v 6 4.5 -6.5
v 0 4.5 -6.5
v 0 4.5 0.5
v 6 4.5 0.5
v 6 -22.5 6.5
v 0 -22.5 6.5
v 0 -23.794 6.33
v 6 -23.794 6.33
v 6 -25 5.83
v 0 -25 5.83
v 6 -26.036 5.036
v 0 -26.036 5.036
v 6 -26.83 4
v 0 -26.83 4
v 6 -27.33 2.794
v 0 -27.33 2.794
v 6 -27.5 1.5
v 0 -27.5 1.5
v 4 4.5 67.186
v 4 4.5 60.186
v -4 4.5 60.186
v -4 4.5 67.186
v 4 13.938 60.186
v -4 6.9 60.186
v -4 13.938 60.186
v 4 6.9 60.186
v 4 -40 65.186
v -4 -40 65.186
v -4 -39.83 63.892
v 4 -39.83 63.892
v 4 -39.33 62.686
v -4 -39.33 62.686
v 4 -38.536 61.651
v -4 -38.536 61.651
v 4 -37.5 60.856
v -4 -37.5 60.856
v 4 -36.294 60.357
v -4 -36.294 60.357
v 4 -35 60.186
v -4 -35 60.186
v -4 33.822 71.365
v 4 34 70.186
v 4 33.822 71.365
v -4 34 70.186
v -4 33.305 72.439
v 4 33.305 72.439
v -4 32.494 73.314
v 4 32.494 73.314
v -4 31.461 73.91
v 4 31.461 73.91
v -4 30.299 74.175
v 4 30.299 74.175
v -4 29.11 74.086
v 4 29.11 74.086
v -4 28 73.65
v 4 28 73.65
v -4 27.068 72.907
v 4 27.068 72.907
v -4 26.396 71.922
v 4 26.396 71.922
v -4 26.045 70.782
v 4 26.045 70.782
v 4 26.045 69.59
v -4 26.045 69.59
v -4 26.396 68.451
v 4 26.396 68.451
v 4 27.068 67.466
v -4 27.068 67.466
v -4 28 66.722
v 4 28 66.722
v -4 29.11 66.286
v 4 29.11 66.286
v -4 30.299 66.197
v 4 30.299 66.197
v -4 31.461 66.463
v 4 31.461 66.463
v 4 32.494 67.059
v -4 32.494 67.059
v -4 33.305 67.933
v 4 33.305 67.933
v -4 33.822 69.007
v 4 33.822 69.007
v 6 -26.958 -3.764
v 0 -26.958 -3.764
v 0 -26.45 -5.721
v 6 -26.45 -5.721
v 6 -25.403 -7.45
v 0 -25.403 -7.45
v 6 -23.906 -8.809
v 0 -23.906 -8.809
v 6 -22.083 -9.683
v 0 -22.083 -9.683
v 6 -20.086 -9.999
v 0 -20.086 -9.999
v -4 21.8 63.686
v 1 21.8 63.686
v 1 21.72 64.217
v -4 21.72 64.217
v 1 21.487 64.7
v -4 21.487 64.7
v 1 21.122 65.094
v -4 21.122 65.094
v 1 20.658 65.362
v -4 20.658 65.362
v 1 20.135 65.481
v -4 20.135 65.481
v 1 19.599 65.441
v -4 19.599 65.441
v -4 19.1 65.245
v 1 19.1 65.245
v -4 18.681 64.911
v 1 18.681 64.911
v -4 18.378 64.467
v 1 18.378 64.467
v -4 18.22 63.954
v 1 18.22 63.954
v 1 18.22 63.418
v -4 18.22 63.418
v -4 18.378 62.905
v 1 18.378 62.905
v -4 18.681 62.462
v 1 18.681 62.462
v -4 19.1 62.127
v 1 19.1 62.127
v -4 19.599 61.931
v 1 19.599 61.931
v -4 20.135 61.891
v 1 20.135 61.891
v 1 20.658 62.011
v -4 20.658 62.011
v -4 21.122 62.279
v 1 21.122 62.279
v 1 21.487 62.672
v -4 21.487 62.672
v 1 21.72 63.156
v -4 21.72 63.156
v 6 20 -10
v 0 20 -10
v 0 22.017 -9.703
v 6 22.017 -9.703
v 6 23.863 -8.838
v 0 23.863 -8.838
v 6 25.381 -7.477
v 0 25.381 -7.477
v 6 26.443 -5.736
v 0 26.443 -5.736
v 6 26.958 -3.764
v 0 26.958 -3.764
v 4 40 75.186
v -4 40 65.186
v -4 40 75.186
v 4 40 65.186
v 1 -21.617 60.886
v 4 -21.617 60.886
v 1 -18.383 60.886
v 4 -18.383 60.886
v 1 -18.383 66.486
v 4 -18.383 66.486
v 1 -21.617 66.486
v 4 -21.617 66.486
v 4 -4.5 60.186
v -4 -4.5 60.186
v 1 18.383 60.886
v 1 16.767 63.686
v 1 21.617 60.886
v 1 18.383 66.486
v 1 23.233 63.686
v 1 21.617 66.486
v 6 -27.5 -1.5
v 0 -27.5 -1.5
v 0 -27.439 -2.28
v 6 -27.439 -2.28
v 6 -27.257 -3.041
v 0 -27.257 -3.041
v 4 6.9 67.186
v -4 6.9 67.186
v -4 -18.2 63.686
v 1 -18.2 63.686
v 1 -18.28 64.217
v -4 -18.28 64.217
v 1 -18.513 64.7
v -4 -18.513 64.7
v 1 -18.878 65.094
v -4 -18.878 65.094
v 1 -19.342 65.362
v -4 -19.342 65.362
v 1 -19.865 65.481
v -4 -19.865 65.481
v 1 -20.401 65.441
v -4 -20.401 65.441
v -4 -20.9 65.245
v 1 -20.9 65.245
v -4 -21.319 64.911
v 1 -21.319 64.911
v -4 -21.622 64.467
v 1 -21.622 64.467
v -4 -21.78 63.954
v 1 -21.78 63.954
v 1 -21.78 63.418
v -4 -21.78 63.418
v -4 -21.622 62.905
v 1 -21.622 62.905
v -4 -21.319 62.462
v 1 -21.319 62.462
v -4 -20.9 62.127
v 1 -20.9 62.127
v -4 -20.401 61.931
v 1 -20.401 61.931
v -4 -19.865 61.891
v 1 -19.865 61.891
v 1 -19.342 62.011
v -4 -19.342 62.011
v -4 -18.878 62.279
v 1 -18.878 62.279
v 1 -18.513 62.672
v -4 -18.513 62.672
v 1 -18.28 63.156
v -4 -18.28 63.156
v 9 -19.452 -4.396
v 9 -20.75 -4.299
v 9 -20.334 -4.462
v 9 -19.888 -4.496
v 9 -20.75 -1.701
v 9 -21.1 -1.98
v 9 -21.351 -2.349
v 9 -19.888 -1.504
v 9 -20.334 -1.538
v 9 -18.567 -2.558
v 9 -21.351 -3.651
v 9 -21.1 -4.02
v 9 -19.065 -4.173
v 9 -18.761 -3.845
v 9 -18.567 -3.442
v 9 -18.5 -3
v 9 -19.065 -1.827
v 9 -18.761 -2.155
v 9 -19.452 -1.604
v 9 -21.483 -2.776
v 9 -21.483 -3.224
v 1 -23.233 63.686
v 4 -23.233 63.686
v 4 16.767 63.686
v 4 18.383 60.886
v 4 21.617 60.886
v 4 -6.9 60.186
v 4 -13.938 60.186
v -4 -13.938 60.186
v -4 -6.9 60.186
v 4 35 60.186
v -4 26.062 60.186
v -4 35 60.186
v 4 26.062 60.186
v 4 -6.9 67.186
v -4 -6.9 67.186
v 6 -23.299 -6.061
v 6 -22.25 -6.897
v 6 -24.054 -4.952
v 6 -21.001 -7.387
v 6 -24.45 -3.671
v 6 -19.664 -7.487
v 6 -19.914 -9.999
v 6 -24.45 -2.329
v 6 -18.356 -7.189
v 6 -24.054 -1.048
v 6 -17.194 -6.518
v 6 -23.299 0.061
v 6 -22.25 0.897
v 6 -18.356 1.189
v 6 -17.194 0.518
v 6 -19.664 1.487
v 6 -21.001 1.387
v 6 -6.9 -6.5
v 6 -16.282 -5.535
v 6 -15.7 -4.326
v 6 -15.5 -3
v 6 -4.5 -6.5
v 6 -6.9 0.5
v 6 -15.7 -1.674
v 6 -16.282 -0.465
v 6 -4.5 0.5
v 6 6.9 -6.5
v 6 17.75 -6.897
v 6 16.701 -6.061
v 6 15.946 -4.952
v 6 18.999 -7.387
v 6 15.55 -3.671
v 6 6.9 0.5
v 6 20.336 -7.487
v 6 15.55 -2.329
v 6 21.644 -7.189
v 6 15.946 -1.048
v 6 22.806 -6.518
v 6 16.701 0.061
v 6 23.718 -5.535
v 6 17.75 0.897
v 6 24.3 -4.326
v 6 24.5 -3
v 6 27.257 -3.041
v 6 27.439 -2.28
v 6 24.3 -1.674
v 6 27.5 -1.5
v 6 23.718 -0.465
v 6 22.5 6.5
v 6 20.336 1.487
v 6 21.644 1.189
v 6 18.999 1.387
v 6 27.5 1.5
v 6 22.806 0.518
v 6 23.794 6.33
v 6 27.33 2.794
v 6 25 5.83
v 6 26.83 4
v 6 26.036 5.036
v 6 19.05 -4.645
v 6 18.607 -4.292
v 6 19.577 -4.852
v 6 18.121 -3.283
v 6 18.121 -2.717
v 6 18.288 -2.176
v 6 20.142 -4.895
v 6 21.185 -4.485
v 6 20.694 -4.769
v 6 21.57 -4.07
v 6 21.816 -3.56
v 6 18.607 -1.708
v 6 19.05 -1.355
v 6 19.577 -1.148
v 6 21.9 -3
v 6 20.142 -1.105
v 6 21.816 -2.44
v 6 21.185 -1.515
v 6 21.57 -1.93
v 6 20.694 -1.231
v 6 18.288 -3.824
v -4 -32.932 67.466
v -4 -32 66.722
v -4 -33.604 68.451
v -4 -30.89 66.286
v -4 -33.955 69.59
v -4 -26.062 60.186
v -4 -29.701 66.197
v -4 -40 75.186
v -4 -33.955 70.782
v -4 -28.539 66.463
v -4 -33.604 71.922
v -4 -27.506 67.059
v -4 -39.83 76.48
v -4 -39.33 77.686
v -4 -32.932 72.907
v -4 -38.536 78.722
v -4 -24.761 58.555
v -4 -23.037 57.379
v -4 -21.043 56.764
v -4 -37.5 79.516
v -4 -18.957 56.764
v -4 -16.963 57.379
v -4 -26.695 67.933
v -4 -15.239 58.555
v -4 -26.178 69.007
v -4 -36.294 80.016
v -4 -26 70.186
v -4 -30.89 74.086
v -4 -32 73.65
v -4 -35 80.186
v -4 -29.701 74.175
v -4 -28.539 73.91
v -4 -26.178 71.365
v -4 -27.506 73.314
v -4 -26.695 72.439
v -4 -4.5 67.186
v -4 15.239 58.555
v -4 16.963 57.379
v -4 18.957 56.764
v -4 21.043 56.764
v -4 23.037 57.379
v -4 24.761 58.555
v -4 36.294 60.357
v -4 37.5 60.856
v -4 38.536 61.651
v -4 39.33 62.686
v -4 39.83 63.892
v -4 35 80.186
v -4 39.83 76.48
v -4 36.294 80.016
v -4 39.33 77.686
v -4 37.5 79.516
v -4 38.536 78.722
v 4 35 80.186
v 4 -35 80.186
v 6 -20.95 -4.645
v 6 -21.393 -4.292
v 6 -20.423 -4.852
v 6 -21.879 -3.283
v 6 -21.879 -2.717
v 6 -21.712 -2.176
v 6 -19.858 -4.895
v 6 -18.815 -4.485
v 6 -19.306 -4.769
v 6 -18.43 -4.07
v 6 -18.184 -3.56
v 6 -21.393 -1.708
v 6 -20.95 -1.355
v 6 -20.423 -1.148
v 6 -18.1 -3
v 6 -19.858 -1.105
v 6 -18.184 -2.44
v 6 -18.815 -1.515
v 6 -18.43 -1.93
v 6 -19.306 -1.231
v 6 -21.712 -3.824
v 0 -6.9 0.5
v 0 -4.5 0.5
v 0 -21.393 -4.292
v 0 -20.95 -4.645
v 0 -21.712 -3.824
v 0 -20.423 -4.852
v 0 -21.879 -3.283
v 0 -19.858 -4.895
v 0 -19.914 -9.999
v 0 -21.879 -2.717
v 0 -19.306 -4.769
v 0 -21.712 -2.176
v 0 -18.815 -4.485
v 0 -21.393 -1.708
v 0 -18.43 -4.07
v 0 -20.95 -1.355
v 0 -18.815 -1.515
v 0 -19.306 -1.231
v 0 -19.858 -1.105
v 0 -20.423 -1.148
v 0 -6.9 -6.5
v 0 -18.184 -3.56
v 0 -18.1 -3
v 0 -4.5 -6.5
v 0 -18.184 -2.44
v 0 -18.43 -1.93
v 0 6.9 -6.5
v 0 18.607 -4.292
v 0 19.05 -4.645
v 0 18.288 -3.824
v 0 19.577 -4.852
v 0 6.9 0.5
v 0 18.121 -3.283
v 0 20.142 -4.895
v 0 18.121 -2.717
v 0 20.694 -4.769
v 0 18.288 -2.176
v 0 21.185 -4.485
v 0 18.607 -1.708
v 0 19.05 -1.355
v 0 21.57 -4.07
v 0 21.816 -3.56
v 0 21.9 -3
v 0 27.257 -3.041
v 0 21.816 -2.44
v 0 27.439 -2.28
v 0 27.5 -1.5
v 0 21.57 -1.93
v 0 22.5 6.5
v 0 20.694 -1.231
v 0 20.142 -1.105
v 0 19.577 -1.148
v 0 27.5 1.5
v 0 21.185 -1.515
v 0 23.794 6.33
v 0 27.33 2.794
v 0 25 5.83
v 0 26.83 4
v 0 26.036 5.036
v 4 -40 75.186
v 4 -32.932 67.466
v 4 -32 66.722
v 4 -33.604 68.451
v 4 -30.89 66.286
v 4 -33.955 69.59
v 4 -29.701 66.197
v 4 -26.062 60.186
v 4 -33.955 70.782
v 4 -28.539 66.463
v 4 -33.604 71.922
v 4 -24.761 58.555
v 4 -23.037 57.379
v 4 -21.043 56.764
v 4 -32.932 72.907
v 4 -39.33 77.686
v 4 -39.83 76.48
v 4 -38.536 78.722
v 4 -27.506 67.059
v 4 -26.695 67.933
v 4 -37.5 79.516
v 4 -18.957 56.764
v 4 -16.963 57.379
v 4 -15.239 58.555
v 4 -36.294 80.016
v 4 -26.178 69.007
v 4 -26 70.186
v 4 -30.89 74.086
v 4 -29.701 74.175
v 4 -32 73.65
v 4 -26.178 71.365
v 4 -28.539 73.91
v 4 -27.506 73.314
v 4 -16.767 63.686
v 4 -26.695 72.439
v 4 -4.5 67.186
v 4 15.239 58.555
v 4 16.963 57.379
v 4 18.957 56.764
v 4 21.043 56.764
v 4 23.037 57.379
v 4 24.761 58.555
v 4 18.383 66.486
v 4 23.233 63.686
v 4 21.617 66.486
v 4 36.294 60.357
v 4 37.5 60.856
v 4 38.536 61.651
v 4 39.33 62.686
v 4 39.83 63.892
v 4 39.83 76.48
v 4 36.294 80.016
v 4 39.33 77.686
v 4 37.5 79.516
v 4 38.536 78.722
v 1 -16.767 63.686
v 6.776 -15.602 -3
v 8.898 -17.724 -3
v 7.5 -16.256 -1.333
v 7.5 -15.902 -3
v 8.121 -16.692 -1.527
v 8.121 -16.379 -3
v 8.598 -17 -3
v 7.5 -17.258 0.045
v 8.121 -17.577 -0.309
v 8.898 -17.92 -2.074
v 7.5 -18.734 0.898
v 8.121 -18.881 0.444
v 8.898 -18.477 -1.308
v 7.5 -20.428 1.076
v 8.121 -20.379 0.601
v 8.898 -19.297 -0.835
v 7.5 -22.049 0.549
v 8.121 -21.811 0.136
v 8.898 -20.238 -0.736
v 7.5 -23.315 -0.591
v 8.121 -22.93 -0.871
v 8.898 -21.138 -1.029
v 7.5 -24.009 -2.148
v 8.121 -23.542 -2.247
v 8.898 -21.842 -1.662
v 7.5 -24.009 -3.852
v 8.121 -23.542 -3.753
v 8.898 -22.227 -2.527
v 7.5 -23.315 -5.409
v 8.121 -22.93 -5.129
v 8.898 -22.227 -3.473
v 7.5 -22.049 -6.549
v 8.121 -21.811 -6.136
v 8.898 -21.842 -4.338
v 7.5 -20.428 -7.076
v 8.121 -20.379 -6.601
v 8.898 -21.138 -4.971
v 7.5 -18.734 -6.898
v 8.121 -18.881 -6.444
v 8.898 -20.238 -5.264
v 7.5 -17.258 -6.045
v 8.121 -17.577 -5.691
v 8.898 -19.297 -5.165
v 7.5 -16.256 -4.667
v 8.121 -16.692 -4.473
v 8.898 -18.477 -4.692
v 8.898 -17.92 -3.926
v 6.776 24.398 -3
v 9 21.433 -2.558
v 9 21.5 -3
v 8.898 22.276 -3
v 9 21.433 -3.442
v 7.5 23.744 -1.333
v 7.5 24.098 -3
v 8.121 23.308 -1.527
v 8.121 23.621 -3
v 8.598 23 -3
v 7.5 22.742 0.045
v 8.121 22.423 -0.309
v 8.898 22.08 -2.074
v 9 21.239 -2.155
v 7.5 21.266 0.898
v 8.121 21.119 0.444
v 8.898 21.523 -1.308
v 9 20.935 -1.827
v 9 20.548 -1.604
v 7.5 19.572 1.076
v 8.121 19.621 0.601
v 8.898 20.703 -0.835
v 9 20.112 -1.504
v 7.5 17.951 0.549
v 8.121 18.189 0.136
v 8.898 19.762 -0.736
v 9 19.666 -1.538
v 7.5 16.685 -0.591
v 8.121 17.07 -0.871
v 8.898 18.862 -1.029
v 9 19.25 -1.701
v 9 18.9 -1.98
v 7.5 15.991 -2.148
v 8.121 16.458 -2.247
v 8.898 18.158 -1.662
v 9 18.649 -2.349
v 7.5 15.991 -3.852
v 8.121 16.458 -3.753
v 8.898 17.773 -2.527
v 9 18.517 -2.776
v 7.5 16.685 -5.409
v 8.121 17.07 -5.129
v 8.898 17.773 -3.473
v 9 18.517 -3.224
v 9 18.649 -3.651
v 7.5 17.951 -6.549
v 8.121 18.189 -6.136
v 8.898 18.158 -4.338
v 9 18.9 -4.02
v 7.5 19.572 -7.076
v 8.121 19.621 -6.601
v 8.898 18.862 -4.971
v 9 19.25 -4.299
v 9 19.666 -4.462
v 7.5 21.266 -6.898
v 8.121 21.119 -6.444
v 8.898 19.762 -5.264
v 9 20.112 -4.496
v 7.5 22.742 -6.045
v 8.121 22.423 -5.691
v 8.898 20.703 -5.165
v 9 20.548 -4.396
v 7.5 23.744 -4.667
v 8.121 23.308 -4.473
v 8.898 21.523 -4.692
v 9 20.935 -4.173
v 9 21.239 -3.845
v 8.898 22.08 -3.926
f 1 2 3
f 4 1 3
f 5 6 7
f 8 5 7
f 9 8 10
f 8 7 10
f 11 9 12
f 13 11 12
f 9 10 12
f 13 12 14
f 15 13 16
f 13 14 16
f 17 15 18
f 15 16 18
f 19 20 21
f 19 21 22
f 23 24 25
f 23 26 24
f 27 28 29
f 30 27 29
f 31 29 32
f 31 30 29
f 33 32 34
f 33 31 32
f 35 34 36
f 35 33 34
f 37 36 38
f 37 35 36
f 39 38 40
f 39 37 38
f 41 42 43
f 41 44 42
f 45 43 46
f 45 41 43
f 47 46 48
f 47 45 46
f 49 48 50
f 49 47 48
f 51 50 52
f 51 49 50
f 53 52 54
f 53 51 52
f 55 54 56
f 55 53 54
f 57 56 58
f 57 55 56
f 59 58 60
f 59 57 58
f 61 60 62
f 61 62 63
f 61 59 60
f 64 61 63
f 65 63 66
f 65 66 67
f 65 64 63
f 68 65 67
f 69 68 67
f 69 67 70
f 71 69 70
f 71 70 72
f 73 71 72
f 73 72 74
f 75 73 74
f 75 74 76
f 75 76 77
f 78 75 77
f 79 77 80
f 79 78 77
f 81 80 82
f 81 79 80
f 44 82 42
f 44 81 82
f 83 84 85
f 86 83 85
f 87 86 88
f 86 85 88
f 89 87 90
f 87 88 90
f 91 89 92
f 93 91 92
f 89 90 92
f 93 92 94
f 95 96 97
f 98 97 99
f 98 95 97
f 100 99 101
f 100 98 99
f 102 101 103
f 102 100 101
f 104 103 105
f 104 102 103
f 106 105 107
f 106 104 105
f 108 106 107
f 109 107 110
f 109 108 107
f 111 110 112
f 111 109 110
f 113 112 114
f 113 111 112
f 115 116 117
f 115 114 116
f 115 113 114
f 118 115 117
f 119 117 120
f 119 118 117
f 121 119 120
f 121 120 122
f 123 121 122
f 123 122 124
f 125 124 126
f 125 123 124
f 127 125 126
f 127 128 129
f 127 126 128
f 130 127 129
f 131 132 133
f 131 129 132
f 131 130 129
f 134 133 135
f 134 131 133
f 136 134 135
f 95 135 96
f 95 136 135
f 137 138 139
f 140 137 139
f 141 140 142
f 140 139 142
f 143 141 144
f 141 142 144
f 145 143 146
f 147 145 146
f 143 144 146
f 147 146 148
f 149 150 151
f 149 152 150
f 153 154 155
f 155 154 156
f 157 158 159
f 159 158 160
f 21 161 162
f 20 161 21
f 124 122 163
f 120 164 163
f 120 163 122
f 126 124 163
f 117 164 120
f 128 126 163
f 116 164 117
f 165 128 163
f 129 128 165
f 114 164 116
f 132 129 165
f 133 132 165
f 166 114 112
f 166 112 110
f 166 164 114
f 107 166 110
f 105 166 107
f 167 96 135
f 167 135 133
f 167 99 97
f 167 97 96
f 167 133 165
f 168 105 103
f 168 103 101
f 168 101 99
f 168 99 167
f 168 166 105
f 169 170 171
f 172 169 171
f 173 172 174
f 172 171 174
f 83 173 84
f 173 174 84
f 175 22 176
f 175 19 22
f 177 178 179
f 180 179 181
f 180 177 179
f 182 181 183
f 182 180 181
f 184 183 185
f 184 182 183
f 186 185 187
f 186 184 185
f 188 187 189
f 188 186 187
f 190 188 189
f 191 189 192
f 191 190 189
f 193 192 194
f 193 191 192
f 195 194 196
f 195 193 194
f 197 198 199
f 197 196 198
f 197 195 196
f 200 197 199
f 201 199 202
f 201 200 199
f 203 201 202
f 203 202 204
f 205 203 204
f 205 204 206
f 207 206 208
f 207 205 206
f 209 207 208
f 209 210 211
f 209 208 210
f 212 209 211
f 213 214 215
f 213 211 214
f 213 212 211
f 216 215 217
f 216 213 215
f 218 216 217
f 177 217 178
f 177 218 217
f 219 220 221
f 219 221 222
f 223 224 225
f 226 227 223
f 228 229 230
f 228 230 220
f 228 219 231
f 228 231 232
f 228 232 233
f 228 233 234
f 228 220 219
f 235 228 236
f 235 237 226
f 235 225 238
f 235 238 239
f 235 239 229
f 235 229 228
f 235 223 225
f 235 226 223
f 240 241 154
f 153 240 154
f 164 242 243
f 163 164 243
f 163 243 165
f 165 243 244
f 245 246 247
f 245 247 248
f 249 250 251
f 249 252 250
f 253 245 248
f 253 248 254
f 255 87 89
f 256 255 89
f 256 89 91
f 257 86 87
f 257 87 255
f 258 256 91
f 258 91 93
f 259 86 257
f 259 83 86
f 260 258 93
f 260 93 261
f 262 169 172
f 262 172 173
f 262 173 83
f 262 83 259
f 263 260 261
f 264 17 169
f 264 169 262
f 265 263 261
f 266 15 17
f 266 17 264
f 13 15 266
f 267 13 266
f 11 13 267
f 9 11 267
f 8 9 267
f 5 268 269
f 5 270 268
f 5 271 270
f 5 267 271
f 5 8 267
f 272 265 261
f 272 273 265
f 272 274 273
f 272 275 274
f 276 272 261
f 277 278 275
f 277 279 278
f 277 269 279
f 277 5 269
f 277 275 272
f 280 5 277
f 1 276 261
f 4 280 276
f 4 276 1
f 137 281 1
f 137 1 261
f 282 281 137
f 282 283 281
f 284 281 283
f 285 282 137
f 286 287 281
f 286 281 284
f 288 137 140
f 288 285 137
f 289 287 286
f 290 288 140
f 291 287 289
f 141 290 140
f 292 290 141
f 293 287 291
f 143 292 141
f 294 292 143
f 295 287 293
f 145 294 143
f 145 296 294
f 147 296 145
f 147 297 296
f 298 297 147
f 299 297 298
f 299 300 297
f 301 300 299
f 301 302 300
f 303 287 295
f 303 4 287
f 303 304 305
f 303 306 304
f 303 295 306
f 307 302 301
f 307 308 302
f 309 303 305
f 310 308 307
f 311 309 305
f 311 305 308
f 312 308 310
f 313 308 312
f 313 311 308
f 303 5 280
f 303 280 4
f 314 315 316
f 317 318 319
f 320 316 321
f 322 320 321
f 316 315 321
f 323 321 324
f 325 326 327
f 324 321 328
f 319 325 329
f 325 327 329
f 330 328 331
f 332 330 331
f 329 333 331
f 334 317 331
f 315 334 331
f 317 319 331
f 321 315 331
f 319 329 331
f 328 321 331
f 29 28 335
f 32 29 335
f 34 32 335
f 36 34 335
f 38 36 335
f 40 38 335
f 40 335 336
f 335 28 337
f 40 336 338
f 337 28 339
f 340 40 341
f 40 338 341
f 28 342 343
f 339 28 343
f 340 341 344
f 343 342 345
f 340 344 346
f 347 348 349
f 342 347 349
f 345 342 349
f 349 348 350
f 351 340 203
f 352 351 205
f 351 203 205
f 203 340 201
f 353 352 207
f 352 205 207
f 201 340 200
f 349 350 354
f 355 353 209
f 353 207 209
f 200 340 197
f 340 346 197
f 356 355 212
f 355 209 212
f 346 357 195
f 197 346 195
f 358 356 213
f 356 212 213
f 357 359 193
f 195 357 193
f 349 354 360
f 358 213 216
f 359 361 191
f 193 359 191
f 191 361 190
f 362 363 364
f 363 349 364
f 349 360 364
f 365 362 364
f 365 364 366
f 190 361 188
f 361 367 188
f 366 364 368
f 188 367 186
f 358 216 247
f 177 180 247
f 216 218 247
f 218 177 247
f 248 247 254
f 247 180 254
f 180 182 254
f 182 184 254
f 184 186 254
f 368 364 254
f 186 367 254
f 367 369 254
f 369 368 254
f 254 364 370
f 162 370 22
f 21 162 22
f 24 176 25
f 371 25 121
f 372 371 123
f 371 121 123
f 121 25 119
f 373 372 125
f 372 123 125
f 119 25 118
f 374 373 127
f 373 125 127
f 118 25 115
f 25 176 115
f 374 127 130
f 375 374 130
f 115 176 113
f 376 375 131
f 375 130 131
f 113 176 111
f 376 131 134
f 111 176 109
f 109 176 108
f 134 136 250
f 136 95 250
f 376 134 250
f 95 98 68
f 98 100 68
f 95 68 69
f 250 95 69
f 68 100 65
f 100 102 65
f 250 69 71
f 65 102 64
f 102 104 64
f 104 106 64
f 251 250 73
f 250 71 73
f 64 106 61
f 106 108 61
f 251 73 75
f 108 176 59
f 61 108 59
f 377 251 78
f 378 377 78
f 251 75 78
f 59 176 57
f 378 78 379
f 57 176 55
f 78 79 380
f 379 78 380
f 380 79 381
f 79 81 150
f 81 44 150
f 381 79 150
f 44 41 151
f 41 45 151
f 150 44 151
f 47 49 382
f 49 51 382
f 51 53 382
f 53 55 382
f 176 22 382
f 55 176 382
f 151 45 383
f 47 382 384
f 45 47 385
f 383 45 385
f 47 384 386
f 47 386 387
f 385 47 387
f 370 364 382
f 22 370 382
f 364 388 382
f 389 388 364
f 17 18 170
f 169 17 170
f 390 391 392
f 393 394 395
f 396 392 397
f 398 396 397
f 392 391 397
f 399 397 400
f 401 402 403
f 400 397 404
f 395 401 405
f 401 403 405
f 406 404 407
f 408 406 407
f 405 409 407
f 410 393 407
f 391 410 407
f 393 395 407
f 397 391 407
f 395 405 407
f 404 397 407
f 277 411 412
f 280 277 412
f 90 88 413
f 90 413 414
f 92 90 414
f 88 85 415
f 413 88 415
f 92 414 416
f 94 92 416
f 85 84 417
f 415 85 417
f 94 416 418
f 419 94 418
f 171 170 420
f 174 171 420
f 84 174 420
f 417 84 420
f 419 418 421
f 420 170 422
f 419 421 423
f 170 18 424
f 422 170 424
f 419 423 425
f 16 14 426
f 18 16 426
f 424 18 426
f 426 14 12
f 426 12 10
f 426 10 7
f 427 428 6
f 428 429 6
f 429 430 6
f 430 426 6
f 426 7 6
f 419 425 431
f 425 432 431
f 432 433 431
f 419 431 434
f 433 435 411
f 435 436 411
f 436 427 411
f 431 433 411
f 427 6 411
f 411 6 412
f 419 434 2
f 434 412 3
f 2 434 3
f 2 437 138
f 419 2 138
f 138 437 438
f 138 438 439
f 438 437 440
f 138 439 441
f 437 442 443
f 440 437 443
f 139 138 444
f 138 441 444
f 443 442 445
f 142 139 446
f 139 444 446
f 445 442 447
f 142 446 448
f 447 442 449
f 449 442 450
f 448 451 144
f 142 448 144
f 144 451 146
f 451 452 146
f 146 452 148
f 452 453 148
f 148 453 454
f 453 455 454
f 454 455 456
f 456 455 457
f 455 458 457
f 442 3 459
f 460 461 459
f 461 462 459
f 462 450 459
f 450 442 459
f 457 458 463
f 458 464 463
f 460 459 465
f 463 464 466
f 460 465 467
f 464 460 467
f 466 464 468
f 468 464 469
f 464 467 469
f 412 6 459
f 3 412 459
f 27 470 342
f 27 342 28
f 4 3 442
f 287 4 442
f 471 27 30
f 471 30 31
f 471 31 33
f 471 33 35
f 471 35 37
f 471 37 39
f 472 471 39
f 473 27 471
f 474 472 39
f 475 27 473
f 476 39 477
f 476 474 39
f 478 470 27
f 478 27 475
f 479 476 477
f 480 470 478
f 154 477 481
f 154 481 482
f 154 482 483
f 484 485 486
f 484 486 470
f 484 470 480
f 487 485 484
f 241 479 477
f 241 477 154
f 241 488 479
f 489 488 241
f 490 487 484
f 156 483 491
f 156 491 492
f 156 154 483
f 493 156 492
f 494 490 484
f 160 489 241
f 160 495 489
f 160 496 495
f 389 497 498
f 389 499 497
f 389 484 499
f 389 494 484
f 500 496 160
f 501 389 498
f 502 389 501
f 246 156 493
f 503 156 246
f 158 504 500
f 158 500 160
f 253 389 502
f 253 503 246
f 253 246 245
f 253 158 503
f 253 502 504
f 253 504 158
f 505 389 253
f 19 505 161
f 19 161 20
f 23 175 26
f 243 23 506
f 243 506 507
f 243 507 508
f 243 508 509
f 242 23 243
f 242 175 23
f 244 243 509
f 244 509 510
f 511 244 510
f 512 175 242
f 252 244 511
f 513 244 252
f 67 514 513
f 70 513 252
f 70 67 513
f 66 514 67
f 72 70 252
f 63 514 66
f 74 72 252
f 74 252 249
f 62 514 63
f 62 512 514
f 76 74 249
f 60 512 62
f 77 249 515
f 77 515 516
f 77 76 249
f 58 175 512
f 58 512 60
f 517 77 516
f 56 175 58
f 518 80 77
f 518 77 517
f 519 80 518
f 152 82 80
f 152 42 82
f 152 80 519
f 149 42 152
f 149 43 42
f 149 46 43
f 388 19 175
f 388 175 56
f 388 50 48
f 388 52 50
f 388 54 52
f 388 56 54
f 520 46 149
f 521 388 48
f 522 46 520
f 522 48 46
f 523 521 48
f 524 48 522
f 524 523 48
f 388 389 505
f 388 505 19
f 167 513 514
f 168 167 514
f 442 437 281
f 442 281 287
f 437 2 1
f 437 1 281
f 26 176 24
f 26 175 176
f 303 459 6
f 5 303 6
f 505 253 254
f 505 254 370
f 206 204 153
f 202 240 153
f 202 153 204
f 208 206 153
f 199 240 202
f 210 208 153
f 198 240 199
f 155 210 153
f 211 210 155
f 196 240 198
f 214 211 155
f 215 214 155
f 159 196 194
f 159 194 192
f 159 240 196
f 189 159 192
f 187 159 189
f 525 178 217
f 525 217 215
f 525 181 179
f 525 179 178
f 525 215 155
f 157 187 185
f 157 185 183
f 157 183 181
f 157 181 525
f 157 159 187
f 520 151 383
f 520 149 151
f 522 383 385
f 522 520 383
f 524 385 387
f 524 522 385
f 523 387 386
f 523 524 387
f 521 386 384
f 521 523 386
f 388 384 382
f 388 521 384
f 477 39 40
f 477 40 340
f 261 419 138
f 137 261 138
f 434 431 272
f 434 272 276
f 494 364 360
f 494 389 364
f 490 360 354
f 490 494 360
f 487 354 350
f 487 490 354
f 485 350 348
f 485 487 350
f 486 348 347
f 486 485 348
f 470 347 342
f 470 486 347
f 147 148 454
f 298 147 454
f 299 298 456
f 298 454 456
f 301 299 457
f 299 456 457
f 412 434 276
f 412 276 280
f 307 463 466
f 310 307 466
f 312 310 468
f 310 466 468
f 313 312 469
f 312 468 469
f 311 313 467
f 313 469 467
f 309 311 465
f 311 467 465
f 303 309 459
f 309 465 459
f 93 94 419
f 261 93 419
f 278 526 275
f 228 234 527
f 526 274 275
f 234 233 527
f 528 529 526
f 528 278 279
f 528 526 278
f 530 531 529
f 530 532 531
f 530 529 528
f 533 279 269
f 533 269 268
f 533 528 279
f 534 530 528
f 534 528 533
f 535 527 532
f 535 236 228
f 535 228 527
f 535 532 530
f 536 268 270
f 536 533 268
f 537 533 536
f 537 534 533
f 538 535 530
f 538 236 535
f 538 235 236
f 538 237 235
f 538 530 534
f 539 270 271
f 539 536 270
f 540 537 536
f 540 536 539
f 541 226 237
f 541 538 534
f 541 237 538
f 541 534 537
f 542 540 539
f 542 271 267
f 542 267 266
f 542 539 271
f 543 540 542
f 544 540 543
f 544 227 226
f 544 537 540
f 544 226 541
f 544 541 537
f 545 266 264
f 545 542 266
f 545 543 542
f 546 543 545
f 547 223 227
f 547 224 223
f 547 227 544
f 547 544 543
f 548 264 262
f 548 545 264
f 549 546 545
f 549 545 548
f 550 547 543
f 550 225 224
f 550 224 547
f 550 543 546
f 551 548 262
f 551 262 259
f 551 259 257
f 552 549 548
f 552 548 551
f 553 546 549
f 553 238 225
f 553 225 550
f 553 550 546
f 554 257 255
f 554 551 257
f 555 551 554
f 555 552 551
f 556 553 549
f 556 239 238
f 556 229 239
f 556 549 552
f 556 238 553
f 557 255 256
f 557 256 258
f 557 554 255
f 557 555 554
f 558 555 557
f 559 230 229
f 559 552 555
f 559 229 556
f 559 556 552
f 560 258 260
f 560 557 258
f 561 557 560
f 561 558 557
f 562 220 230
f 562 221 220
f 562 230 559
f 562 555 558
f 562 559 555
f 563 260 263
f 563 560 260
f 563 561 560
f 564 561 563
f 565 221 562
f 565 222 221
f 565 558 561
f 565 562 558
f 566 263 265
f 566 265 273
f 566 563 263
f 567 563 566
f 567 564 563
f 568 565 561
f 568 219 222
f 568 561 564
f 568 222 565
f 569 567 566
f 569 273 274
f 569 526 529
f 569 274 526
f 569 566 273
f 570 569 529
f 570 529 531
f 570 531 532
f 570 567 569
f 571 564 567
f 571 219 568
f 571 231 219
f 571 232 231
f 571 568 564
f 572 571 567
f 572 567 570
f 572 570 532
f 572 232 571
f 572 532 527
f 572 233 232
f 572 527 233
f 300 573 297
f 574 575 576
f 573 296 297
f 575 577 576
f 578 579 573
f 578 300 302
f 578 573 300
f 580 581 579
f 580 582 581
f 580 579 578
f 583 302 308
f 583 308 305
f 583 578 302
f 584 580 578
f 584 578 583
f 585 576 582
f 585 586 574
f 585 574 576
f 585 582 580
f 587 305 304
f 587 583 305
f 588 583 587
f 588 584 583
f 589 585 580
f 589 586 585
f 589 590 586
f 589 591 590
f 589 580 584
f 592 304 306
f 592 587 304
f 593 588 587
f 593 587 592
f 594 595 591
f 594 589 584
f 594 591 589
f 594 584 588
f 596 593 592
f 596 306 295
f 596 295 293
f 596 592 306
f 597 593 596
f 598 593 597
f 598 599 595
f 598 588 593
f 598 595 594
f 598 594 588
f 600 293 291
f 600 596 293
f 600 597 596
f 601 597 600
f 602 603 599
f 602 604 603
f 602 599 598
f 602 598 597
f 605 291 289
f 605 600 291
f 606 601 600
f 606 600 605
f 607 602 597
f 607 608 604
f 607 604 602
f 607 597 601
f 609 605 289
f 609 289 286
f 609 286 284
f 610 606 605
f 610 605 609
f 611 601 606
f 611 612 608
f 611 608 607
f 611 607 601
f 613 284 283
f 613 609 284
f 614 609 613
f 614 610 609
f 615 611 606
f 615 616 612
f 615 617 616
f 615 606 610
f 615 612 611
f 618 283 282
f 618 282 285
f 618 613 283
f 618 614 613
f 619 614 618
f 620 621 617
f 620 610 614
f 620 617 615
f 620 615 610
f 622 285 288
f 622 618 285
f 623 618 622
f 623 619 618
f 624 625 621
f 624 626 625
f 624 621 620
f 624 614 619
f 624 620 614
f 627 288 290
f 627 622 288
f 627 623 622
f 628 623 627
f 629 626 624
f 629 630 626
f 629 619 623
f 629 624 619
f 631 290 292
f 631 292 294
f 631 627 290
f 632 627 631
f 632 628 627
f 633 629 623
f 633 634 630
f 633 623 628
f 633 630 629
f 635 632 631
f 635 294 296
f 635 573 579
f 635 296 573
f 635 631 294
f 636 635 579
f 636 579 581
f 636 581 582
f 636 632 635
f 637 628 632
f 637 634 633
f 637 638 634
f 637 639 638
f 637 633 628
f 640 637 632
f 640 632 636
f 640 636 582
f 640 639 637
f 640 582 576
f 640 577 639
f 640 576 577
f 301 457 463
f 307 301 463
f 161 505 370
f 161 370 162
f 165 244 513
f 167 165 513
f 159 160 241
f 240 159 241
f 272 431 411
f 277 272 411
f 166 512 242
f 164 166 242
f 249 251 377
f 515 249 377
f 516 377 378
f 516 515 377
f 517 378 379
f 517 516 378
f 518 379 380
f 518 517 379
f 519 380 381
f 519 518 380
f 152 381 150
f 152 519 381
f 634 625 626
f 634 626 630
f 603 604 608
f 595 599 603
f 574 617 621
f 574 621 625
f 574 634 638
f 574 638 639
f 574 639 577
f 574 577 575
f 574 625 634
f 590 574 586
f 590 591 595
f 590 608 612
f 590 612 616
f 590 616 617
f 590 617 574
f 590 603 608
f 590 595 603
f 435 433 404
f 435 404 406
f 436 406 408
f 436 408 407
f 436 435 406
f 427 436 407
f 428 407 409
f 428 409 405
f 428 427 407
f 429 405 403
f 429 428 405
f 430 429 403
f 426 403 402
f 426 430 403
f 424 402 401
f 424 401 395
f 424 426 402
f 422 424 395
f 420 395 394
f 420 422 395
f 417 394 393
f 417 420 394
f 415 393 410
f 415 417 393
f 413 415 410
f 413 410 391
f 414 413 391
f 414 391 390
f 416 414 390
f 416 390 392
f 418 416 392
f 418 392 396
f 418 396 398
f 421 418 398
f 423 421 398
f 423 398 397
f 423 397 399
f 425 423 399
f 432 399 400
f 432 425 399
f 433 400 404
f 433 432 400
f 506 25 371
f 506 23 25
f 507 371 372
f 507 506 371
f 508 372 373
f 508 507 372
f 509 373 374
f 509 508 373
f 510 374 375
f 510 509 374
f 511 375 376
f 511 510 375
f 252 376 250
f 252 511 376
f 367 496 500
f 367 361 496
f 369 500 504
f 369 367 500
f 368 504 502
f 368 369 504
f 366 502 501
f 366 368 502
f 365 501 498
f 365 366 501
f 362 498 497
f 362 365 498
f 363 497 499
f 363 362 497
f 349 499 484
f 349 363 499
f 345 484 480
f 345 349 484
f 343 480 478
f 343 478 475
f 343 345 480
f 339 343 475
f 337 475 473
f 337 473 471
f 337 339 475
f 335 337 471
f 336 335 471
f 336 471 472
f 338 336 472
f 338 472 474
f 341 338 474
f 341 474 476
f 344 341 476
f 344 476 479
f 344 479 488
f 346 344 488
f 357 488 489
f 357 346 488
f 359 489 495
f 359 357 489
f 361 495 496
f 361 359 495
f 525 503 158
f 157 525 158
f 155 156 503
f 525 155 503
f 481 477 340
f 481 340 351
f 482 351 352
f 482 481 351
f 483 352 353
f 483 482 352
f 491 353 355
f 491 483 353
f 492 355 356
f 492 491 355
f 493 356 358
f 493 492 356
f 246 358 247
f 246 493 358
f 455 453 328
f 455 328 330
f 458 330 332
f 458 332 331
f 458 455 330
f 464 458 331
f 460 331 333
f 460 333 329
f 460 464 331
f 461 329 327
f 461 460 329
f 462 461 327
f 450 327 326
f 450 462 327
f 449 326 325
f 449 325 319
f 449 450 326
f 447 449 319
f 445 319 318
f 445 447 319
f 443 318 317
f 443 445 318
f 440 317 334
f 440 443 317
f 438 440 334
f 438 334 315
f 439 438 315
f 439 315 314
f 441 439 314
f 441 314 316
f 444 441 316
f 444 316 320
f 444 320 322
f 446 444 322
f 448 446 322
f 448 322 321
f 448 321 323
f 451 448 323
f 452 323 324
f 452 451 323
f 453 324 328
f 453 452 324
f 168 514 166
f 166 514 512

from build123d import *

# Parameters (mm, degrees)
F0_R      = 5
F0_R_2    = 4
F1_DEPTH  = 4
F2_R      = 1.4
F3_DEPTH  = 13
F4_R      = 1.8
F4_R_2    = 4
F5_DEPTH  = 4
F7_DEPTH  = 3
F8_R      = 1.9
F8_W      = 2.4
F8_H      = 7
F9_DEPTH  = 6
F11_R     = 4.5
F12_DEPTH = 3
F13_R     = 2.99999


# Not quite as in the source:
# - a fillet or chamfer is up to 0.001 mm smaller than in the source, because OpenCascade refuses the exact size


with BuildPart() as f1:
    # F0 (on Right) → F1 (new body, symmetric)
    with BuildSketch(Plane.YZ):
        with BuildLine():
            Line((-11, 25), (-35, 25))
            ThreePointArc((-35, 25), (-38.5355339059, 23.5355339059), (-40, 20))
            Line((-40, 20), (-40, -25))
            Line((-40, -25), (40, -25))
            Line((40, -25), (40, 20))
            ThreePointArc((40, 20), (38.5355339059, 23.5355339059), (35, 25))
            Line((35, 25), (11, 25))
            Line((11, 25), (11, 10))
            ThreePointArc((11, 10), (10.4142135624, 8.5857864376), (9, 8))
            Line((9, 8), (-9, 8))
            ThreePointArc((-9, 8), (-10.4142135624, 8.5857864376), (-11, 10))
            Line((-11, 10), (-11, 25))
        make_face()
        with Locations((-30, -13)):
            Circle(F0_R, mode=Mode.SUBTRACT)
        with Locations((30, -13)):
            Circle(F0_R, mode=Mode.SUBTRACT)
        with Locations((-30, 13)):
            Circle(F0_R_2, mode=Mode.SUBTRACT)
        with Locations((30, 13)):
            Circle(F0_R_2, mode=Mode.SUBTRACT)
    extrude(amount=F1_DEPTH, both=True)

    # F2 (on face) → F3 (cut)
    with BuildSketch(Plane.XY.offset(25)):
        with Locations((0, 30)):
            Circle(F2_R)
        with Locations((0, 24)):
            Circle(F2_R)
        with Locations((0, -24)):
            Circle(F2_R)
        with Locations((0, -30)):
            Circle(F2_R)
    extrude(amount=-F3_DEPTH, mode=Mode.SUBTRACT)


with BuildPart() as f5:
    # F4 (on Right) → F5 (new body, symmetric)
    with BuildSketch(Plane.YZ):
        with BuildLine():
            Line((-11, 80.1862078905), (-35, 80.1862078905))
            ThreePointArc((-35, 80.1862078905), (-38.5355339059, 78.7217417964), (-40, 75.1862078905))
            Line((-40, 75.1862078905), (-40, 65.1862078905))
            ThreePointArc((-40, 65.1862078905), (-38.5355339059, 61.6506739846), (-35, 60.1862078905))
            Line((-35, 60.1862078905), (-26.0621778265, 60.1862078905))
            ThreePointArc((-26.0621778265, 60.1862078905), (-20, 56.6862078905), (-13.9378221735, 60.1862078905))
            Line((-13.9378221735, 60.1862078905), (-6.9, 60.1862078905))
            Line((-6.9, 60.1862078905), (-6.9, 67.1862078905))
            Line((-6.9, 67.1862078905), (-4.5, 67.1862078905))
            Line((-4.5, 67.1862078905), (-4.5, 60.1862078905))
            Line((-4.5, 60.1862078905), (4.5, 60.1862078905))
            Line((4.5, 60.1862078905), (4.5, 67.1862078905))
            Line((4.5, 67.1862078905), (6.9, 67.1862078905))
            Line((6.9, 67.1862078905), (6.9, 60.1862078905))
            Line((6.9, 60.1862078905), (13.9378221735, 60.1862078905))
            ThreePointArc((13.9378221735, 60.1862078905), (20, 56.6862078905), (26.0621778265, 60.1862078905))
            Line((26.0621778265, 60.1862078905), (35, 60.1862078905))
            ThreePointArc((35, 60.1862078905), (38.5355339059, 61.6506739846), (40, 65.1862078905))
            Line((40, 65.1862078905), (40, 75.1862078905))
            ThreePointArc((40, 75.1862078905), (38.5355339059, 78.7217417964), (35, 80.1862078905))
            Line((35, 80.1862078905), (11, 80.1862078905))
            Line((11, 80.1862078905), (-11, 80.1862078905))
        make_face()
        with Locations((-20, 63.6862078905)):
            Circle(F4_R, mode=Mode.SUBTRACT)
        with Locations((20, 63.6862078905)):
            Circle(F4_R, mode=Mode.SUBTRACT)
        with Locations((-30, 70.1862078905)):
            Circle(F4_R_2, mode=Mode.SUBTRACT)
        with Locations((30, 70.1862078905)):
            Circle(F4_R_2, mode=Mode.SUBTRACT)
    extrude(amount=F5_DEPTH, both=True)

    # F6 (on face) → F7 (cut)
    with BuildSketch(Plane.YZ.offset(4)):
        Polygon((21.6165807537, 66.4862078905), (18.3834192463, 66.4862078905), (16.7668384925, 63.6862078905), (18.3834192463, 60.8862078905), (21.6165807537, 60.8862078905), (23.2331615075, 63.6862078905), align=None)
        Polygon((-18.3834192463, 66.4862078905), (-21.6165807537, 66.4862078905), (-23.2331615075, 63.6862078905), (-21.6165807537, 60.8862078905), (-18.3834192463, 60.8862078905), (-16.7668384925, 63.6862078905), align=None)
    extrude(amount=-F7_DEPTH, mode=Mode.SUBTRACT)


with BuildPart() as f9:
    # F8 (on Right) → F9 (new body)
    with BuildSketch(Plane.YZ):
        with BuildLine():
            Line((22.5, 6.5), (-22.5, 6.5))
            ThreePointArc((-22.5, 6.5), (-26.0355339059, 5.0355339059), (-27.5, 1.5))
            Line((-27.5, 1.5), (-27.5, -1.5))
            ThreePointArc((-27.5, -1.5), (-27.3626680324, -2.6638125307), (-26.9582161573, -3.7636935955))
            ThreePointArc((-26.9582161573, -3.7636935955), (-24.7038160383, -8.1840249496), (-20.085830036, -9.9994737806))
            Line((-20.085830036, -9.9994737806), (-19.9143537329, -9.9994760316))
            Line((-19.9143537329, -9.9994760316), (19.9999081087, -9.9999999994))
            ThreePointArc((19.9999081087, -9.9999999994), (24.6719110347, -8.2127964936), (26.9582161573, -3.7636935955))
            ThreePointArc((26.9582161573, -3.7636935955), (27.3626680324, -2.6638125307), (27.5, -1.5))
            Line((27.5, -1.5), (27.5, 1.5))
            ThreePointArc((27.5, 1.5), (26.0355339059, 5.0355339059), (22.5, 6.5))
        make_face()
        with Locations((-20, -3)):
            Circle(F8_R, mode=Mode.SUBTRACT)
        with Locations((-5.7, -3)):
            Rectangle(F8_W, F8_H, mode=Mode.SUBTRACT)
        with Locations((5.7, -3)):
            Rectangle(F8_W, F8_H, mode=Mode.SUBTRACT)
        with Locations((20, -3)):
            Circle(F8_R, mode=Mode.SUBTRACT)
    extrude(amount=F9_DEPTH)

    # F11 (on face) → F12 (join)
    with BuildSketch(Plane.YZ.offset(6)):
        with Locations((-20, -3)):
            Circle(F11_R)
        with Locations((20, -3)):
            Circle(F11_R)
    extrude(amount=F12_DEPTH)

    # F13 (radius 3 in the source; OpenCascade refuses exactly that, so slightly less here)
    f13_edges = [f9.edges().sort_by_distance(p)[0] for p in [
        (9, -24.5, -3),
        (9, 15.5, -3),
    ]]
    fillet(f13_edges, radius=F13_R)


solid = Compound([f5.part, f9.part])
